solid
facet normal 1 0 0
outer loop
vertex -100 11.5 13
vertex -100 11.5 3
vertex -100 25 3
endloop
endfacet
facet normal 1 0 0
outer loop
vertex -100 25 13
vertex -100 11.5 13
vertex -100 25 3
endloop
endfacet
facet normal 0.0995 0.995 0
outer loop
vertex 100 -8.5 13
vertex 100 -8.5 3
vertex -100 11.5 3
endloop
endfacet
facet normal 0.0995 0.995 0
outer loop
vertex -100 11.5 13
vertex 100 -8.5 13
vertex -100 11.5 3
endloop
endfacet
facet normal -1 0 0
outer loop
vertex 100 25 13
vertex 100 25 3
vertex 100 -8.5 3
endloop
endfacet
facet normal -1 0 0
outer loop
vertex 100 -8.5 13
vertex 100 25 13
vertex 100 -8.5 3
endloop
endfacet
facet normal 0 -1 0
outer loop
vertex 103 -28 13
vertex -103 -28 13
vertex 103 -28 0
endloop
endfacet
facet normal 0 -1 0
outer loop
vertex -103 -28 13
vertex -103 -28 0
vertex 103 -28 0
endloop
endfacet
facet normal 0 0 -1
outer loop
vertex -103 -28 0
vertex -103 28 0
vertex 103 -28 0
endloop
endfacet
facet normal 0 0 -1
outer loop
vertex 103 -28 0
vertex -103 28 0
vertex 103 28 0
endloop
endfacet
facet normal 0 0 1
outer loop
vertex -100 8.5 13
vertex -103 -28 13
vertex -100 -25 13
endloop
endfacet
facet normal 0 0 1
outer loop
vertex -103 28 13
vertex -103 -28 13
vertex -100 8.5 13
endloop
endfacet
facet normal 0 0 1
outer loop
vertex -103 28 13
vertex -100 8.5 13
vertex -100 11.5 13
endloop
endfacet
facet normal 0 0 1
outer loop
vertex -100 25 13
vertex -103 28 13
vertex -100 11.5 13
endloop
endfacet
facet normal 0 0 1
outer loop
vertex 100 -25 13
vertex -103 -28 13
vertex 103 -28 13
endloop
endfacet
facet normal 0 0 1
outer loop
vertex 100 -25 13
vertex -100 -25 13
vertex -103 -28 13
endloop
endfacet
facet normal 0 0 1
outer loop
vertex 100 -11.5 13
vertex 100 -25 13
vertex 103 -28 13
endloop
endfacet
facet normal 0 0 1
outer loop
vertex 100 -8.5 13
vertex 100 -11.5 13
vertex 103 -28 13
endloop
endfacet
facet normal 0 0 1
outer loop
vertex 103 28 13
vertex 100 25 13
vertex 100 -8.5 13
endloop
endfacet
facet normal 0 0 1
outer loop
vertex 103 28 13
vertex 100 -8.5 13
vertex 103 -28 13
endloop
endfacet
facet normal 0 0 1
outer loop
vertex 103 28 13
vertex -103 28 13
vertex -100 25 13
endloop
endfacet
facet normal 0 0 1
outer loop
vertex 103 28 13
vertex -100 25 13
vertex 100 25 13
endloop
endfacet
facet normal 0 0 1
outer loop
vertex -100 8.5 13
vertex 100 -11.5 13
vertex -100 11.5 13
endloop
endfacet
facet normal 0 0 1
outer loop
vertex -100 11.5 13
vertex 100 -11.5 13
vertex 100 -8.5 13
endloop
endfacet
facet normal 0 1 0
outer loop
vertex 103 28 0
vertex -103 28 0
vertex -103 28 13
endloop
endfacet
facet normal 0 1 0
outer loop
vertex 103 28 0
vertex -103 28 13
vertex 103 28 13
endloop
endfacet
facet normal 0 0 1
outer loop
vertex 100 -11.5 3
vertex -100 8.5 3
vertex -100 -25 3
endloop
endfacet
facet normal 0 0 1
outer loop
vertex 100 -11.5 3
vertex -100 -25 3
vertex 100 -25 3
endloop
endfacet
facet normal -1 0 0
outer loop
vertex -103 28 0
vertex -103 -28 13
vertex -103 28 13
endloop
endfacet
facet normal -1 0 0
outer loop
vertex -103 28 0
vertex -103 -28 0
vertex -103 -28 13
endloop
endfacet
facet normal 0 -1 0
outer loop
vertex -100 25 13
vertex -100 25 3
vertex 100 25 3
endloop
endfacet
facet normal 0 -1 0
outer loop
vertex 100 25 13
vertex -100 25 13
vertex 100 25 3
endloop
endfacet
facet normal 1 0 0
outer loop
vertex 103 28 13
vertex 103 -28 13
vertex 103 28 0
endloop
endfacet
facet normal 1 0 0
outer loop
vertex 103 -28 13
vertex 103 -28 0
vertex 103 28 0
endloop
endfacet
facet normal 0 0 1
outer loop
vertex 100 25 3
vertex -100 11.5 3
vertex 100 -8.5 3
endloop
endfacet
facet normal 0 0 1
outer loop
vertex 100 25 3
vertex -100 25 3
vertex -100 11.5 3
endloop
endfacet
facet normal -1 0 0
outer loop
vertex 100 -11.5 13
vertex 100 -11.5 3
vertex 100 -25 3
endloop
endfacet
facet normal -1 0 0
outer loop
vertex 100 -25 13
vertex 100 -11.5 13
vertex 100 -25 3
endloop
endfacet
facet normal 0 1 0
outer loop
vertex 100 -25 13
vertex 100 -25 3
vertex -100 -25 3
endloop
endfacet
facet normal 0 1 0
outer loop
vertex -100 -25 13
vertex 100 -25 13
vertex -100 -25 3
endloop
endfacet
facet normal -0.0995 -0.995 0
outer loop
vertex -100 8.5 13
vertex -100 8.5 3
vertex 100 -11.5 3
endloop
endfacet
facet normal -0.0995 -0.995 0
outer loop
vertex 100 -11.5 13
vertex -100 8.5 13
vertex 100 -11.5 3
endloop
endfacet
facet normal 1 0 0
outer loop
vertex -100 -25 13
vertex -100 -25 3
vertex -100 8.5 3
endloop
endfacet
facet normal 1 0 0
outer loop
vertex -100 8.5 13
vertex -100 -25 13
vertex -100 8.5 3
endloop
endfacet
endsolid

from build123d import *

# Parameters (mm, degrees)
F0_W     = 206
F0_H     = 56
F1_DEPTH = 3
F2_W     = 206
F2_H     = 56
F3_DEPTH = 10


with BuildPart() as f1:
    # F0 (on Top) → F1 (new body)
    with BuildSketch(Plane.XY):
        Rectangle(F0_W, F0_H)
    extrude(amount=F1_DEPTH)

    # F2 (on face) → F3 (join)
    with BuildSketch(Plane.XY.offset(3)):
        Rectangle(F2_W, F2_H)
        Polygon((100, -25), (-100, -25), (-100, 8.5), (100, -11.5), align=None, mode=Mode.SUBTRACT)
        Polygon((-100, 11.5), (-100, 25), (100, 25), (100, -8.5), align=None, mode=Mode.SUBTRACT)
    extrude(amount=F3_DEPTH)


solid = f1.part
